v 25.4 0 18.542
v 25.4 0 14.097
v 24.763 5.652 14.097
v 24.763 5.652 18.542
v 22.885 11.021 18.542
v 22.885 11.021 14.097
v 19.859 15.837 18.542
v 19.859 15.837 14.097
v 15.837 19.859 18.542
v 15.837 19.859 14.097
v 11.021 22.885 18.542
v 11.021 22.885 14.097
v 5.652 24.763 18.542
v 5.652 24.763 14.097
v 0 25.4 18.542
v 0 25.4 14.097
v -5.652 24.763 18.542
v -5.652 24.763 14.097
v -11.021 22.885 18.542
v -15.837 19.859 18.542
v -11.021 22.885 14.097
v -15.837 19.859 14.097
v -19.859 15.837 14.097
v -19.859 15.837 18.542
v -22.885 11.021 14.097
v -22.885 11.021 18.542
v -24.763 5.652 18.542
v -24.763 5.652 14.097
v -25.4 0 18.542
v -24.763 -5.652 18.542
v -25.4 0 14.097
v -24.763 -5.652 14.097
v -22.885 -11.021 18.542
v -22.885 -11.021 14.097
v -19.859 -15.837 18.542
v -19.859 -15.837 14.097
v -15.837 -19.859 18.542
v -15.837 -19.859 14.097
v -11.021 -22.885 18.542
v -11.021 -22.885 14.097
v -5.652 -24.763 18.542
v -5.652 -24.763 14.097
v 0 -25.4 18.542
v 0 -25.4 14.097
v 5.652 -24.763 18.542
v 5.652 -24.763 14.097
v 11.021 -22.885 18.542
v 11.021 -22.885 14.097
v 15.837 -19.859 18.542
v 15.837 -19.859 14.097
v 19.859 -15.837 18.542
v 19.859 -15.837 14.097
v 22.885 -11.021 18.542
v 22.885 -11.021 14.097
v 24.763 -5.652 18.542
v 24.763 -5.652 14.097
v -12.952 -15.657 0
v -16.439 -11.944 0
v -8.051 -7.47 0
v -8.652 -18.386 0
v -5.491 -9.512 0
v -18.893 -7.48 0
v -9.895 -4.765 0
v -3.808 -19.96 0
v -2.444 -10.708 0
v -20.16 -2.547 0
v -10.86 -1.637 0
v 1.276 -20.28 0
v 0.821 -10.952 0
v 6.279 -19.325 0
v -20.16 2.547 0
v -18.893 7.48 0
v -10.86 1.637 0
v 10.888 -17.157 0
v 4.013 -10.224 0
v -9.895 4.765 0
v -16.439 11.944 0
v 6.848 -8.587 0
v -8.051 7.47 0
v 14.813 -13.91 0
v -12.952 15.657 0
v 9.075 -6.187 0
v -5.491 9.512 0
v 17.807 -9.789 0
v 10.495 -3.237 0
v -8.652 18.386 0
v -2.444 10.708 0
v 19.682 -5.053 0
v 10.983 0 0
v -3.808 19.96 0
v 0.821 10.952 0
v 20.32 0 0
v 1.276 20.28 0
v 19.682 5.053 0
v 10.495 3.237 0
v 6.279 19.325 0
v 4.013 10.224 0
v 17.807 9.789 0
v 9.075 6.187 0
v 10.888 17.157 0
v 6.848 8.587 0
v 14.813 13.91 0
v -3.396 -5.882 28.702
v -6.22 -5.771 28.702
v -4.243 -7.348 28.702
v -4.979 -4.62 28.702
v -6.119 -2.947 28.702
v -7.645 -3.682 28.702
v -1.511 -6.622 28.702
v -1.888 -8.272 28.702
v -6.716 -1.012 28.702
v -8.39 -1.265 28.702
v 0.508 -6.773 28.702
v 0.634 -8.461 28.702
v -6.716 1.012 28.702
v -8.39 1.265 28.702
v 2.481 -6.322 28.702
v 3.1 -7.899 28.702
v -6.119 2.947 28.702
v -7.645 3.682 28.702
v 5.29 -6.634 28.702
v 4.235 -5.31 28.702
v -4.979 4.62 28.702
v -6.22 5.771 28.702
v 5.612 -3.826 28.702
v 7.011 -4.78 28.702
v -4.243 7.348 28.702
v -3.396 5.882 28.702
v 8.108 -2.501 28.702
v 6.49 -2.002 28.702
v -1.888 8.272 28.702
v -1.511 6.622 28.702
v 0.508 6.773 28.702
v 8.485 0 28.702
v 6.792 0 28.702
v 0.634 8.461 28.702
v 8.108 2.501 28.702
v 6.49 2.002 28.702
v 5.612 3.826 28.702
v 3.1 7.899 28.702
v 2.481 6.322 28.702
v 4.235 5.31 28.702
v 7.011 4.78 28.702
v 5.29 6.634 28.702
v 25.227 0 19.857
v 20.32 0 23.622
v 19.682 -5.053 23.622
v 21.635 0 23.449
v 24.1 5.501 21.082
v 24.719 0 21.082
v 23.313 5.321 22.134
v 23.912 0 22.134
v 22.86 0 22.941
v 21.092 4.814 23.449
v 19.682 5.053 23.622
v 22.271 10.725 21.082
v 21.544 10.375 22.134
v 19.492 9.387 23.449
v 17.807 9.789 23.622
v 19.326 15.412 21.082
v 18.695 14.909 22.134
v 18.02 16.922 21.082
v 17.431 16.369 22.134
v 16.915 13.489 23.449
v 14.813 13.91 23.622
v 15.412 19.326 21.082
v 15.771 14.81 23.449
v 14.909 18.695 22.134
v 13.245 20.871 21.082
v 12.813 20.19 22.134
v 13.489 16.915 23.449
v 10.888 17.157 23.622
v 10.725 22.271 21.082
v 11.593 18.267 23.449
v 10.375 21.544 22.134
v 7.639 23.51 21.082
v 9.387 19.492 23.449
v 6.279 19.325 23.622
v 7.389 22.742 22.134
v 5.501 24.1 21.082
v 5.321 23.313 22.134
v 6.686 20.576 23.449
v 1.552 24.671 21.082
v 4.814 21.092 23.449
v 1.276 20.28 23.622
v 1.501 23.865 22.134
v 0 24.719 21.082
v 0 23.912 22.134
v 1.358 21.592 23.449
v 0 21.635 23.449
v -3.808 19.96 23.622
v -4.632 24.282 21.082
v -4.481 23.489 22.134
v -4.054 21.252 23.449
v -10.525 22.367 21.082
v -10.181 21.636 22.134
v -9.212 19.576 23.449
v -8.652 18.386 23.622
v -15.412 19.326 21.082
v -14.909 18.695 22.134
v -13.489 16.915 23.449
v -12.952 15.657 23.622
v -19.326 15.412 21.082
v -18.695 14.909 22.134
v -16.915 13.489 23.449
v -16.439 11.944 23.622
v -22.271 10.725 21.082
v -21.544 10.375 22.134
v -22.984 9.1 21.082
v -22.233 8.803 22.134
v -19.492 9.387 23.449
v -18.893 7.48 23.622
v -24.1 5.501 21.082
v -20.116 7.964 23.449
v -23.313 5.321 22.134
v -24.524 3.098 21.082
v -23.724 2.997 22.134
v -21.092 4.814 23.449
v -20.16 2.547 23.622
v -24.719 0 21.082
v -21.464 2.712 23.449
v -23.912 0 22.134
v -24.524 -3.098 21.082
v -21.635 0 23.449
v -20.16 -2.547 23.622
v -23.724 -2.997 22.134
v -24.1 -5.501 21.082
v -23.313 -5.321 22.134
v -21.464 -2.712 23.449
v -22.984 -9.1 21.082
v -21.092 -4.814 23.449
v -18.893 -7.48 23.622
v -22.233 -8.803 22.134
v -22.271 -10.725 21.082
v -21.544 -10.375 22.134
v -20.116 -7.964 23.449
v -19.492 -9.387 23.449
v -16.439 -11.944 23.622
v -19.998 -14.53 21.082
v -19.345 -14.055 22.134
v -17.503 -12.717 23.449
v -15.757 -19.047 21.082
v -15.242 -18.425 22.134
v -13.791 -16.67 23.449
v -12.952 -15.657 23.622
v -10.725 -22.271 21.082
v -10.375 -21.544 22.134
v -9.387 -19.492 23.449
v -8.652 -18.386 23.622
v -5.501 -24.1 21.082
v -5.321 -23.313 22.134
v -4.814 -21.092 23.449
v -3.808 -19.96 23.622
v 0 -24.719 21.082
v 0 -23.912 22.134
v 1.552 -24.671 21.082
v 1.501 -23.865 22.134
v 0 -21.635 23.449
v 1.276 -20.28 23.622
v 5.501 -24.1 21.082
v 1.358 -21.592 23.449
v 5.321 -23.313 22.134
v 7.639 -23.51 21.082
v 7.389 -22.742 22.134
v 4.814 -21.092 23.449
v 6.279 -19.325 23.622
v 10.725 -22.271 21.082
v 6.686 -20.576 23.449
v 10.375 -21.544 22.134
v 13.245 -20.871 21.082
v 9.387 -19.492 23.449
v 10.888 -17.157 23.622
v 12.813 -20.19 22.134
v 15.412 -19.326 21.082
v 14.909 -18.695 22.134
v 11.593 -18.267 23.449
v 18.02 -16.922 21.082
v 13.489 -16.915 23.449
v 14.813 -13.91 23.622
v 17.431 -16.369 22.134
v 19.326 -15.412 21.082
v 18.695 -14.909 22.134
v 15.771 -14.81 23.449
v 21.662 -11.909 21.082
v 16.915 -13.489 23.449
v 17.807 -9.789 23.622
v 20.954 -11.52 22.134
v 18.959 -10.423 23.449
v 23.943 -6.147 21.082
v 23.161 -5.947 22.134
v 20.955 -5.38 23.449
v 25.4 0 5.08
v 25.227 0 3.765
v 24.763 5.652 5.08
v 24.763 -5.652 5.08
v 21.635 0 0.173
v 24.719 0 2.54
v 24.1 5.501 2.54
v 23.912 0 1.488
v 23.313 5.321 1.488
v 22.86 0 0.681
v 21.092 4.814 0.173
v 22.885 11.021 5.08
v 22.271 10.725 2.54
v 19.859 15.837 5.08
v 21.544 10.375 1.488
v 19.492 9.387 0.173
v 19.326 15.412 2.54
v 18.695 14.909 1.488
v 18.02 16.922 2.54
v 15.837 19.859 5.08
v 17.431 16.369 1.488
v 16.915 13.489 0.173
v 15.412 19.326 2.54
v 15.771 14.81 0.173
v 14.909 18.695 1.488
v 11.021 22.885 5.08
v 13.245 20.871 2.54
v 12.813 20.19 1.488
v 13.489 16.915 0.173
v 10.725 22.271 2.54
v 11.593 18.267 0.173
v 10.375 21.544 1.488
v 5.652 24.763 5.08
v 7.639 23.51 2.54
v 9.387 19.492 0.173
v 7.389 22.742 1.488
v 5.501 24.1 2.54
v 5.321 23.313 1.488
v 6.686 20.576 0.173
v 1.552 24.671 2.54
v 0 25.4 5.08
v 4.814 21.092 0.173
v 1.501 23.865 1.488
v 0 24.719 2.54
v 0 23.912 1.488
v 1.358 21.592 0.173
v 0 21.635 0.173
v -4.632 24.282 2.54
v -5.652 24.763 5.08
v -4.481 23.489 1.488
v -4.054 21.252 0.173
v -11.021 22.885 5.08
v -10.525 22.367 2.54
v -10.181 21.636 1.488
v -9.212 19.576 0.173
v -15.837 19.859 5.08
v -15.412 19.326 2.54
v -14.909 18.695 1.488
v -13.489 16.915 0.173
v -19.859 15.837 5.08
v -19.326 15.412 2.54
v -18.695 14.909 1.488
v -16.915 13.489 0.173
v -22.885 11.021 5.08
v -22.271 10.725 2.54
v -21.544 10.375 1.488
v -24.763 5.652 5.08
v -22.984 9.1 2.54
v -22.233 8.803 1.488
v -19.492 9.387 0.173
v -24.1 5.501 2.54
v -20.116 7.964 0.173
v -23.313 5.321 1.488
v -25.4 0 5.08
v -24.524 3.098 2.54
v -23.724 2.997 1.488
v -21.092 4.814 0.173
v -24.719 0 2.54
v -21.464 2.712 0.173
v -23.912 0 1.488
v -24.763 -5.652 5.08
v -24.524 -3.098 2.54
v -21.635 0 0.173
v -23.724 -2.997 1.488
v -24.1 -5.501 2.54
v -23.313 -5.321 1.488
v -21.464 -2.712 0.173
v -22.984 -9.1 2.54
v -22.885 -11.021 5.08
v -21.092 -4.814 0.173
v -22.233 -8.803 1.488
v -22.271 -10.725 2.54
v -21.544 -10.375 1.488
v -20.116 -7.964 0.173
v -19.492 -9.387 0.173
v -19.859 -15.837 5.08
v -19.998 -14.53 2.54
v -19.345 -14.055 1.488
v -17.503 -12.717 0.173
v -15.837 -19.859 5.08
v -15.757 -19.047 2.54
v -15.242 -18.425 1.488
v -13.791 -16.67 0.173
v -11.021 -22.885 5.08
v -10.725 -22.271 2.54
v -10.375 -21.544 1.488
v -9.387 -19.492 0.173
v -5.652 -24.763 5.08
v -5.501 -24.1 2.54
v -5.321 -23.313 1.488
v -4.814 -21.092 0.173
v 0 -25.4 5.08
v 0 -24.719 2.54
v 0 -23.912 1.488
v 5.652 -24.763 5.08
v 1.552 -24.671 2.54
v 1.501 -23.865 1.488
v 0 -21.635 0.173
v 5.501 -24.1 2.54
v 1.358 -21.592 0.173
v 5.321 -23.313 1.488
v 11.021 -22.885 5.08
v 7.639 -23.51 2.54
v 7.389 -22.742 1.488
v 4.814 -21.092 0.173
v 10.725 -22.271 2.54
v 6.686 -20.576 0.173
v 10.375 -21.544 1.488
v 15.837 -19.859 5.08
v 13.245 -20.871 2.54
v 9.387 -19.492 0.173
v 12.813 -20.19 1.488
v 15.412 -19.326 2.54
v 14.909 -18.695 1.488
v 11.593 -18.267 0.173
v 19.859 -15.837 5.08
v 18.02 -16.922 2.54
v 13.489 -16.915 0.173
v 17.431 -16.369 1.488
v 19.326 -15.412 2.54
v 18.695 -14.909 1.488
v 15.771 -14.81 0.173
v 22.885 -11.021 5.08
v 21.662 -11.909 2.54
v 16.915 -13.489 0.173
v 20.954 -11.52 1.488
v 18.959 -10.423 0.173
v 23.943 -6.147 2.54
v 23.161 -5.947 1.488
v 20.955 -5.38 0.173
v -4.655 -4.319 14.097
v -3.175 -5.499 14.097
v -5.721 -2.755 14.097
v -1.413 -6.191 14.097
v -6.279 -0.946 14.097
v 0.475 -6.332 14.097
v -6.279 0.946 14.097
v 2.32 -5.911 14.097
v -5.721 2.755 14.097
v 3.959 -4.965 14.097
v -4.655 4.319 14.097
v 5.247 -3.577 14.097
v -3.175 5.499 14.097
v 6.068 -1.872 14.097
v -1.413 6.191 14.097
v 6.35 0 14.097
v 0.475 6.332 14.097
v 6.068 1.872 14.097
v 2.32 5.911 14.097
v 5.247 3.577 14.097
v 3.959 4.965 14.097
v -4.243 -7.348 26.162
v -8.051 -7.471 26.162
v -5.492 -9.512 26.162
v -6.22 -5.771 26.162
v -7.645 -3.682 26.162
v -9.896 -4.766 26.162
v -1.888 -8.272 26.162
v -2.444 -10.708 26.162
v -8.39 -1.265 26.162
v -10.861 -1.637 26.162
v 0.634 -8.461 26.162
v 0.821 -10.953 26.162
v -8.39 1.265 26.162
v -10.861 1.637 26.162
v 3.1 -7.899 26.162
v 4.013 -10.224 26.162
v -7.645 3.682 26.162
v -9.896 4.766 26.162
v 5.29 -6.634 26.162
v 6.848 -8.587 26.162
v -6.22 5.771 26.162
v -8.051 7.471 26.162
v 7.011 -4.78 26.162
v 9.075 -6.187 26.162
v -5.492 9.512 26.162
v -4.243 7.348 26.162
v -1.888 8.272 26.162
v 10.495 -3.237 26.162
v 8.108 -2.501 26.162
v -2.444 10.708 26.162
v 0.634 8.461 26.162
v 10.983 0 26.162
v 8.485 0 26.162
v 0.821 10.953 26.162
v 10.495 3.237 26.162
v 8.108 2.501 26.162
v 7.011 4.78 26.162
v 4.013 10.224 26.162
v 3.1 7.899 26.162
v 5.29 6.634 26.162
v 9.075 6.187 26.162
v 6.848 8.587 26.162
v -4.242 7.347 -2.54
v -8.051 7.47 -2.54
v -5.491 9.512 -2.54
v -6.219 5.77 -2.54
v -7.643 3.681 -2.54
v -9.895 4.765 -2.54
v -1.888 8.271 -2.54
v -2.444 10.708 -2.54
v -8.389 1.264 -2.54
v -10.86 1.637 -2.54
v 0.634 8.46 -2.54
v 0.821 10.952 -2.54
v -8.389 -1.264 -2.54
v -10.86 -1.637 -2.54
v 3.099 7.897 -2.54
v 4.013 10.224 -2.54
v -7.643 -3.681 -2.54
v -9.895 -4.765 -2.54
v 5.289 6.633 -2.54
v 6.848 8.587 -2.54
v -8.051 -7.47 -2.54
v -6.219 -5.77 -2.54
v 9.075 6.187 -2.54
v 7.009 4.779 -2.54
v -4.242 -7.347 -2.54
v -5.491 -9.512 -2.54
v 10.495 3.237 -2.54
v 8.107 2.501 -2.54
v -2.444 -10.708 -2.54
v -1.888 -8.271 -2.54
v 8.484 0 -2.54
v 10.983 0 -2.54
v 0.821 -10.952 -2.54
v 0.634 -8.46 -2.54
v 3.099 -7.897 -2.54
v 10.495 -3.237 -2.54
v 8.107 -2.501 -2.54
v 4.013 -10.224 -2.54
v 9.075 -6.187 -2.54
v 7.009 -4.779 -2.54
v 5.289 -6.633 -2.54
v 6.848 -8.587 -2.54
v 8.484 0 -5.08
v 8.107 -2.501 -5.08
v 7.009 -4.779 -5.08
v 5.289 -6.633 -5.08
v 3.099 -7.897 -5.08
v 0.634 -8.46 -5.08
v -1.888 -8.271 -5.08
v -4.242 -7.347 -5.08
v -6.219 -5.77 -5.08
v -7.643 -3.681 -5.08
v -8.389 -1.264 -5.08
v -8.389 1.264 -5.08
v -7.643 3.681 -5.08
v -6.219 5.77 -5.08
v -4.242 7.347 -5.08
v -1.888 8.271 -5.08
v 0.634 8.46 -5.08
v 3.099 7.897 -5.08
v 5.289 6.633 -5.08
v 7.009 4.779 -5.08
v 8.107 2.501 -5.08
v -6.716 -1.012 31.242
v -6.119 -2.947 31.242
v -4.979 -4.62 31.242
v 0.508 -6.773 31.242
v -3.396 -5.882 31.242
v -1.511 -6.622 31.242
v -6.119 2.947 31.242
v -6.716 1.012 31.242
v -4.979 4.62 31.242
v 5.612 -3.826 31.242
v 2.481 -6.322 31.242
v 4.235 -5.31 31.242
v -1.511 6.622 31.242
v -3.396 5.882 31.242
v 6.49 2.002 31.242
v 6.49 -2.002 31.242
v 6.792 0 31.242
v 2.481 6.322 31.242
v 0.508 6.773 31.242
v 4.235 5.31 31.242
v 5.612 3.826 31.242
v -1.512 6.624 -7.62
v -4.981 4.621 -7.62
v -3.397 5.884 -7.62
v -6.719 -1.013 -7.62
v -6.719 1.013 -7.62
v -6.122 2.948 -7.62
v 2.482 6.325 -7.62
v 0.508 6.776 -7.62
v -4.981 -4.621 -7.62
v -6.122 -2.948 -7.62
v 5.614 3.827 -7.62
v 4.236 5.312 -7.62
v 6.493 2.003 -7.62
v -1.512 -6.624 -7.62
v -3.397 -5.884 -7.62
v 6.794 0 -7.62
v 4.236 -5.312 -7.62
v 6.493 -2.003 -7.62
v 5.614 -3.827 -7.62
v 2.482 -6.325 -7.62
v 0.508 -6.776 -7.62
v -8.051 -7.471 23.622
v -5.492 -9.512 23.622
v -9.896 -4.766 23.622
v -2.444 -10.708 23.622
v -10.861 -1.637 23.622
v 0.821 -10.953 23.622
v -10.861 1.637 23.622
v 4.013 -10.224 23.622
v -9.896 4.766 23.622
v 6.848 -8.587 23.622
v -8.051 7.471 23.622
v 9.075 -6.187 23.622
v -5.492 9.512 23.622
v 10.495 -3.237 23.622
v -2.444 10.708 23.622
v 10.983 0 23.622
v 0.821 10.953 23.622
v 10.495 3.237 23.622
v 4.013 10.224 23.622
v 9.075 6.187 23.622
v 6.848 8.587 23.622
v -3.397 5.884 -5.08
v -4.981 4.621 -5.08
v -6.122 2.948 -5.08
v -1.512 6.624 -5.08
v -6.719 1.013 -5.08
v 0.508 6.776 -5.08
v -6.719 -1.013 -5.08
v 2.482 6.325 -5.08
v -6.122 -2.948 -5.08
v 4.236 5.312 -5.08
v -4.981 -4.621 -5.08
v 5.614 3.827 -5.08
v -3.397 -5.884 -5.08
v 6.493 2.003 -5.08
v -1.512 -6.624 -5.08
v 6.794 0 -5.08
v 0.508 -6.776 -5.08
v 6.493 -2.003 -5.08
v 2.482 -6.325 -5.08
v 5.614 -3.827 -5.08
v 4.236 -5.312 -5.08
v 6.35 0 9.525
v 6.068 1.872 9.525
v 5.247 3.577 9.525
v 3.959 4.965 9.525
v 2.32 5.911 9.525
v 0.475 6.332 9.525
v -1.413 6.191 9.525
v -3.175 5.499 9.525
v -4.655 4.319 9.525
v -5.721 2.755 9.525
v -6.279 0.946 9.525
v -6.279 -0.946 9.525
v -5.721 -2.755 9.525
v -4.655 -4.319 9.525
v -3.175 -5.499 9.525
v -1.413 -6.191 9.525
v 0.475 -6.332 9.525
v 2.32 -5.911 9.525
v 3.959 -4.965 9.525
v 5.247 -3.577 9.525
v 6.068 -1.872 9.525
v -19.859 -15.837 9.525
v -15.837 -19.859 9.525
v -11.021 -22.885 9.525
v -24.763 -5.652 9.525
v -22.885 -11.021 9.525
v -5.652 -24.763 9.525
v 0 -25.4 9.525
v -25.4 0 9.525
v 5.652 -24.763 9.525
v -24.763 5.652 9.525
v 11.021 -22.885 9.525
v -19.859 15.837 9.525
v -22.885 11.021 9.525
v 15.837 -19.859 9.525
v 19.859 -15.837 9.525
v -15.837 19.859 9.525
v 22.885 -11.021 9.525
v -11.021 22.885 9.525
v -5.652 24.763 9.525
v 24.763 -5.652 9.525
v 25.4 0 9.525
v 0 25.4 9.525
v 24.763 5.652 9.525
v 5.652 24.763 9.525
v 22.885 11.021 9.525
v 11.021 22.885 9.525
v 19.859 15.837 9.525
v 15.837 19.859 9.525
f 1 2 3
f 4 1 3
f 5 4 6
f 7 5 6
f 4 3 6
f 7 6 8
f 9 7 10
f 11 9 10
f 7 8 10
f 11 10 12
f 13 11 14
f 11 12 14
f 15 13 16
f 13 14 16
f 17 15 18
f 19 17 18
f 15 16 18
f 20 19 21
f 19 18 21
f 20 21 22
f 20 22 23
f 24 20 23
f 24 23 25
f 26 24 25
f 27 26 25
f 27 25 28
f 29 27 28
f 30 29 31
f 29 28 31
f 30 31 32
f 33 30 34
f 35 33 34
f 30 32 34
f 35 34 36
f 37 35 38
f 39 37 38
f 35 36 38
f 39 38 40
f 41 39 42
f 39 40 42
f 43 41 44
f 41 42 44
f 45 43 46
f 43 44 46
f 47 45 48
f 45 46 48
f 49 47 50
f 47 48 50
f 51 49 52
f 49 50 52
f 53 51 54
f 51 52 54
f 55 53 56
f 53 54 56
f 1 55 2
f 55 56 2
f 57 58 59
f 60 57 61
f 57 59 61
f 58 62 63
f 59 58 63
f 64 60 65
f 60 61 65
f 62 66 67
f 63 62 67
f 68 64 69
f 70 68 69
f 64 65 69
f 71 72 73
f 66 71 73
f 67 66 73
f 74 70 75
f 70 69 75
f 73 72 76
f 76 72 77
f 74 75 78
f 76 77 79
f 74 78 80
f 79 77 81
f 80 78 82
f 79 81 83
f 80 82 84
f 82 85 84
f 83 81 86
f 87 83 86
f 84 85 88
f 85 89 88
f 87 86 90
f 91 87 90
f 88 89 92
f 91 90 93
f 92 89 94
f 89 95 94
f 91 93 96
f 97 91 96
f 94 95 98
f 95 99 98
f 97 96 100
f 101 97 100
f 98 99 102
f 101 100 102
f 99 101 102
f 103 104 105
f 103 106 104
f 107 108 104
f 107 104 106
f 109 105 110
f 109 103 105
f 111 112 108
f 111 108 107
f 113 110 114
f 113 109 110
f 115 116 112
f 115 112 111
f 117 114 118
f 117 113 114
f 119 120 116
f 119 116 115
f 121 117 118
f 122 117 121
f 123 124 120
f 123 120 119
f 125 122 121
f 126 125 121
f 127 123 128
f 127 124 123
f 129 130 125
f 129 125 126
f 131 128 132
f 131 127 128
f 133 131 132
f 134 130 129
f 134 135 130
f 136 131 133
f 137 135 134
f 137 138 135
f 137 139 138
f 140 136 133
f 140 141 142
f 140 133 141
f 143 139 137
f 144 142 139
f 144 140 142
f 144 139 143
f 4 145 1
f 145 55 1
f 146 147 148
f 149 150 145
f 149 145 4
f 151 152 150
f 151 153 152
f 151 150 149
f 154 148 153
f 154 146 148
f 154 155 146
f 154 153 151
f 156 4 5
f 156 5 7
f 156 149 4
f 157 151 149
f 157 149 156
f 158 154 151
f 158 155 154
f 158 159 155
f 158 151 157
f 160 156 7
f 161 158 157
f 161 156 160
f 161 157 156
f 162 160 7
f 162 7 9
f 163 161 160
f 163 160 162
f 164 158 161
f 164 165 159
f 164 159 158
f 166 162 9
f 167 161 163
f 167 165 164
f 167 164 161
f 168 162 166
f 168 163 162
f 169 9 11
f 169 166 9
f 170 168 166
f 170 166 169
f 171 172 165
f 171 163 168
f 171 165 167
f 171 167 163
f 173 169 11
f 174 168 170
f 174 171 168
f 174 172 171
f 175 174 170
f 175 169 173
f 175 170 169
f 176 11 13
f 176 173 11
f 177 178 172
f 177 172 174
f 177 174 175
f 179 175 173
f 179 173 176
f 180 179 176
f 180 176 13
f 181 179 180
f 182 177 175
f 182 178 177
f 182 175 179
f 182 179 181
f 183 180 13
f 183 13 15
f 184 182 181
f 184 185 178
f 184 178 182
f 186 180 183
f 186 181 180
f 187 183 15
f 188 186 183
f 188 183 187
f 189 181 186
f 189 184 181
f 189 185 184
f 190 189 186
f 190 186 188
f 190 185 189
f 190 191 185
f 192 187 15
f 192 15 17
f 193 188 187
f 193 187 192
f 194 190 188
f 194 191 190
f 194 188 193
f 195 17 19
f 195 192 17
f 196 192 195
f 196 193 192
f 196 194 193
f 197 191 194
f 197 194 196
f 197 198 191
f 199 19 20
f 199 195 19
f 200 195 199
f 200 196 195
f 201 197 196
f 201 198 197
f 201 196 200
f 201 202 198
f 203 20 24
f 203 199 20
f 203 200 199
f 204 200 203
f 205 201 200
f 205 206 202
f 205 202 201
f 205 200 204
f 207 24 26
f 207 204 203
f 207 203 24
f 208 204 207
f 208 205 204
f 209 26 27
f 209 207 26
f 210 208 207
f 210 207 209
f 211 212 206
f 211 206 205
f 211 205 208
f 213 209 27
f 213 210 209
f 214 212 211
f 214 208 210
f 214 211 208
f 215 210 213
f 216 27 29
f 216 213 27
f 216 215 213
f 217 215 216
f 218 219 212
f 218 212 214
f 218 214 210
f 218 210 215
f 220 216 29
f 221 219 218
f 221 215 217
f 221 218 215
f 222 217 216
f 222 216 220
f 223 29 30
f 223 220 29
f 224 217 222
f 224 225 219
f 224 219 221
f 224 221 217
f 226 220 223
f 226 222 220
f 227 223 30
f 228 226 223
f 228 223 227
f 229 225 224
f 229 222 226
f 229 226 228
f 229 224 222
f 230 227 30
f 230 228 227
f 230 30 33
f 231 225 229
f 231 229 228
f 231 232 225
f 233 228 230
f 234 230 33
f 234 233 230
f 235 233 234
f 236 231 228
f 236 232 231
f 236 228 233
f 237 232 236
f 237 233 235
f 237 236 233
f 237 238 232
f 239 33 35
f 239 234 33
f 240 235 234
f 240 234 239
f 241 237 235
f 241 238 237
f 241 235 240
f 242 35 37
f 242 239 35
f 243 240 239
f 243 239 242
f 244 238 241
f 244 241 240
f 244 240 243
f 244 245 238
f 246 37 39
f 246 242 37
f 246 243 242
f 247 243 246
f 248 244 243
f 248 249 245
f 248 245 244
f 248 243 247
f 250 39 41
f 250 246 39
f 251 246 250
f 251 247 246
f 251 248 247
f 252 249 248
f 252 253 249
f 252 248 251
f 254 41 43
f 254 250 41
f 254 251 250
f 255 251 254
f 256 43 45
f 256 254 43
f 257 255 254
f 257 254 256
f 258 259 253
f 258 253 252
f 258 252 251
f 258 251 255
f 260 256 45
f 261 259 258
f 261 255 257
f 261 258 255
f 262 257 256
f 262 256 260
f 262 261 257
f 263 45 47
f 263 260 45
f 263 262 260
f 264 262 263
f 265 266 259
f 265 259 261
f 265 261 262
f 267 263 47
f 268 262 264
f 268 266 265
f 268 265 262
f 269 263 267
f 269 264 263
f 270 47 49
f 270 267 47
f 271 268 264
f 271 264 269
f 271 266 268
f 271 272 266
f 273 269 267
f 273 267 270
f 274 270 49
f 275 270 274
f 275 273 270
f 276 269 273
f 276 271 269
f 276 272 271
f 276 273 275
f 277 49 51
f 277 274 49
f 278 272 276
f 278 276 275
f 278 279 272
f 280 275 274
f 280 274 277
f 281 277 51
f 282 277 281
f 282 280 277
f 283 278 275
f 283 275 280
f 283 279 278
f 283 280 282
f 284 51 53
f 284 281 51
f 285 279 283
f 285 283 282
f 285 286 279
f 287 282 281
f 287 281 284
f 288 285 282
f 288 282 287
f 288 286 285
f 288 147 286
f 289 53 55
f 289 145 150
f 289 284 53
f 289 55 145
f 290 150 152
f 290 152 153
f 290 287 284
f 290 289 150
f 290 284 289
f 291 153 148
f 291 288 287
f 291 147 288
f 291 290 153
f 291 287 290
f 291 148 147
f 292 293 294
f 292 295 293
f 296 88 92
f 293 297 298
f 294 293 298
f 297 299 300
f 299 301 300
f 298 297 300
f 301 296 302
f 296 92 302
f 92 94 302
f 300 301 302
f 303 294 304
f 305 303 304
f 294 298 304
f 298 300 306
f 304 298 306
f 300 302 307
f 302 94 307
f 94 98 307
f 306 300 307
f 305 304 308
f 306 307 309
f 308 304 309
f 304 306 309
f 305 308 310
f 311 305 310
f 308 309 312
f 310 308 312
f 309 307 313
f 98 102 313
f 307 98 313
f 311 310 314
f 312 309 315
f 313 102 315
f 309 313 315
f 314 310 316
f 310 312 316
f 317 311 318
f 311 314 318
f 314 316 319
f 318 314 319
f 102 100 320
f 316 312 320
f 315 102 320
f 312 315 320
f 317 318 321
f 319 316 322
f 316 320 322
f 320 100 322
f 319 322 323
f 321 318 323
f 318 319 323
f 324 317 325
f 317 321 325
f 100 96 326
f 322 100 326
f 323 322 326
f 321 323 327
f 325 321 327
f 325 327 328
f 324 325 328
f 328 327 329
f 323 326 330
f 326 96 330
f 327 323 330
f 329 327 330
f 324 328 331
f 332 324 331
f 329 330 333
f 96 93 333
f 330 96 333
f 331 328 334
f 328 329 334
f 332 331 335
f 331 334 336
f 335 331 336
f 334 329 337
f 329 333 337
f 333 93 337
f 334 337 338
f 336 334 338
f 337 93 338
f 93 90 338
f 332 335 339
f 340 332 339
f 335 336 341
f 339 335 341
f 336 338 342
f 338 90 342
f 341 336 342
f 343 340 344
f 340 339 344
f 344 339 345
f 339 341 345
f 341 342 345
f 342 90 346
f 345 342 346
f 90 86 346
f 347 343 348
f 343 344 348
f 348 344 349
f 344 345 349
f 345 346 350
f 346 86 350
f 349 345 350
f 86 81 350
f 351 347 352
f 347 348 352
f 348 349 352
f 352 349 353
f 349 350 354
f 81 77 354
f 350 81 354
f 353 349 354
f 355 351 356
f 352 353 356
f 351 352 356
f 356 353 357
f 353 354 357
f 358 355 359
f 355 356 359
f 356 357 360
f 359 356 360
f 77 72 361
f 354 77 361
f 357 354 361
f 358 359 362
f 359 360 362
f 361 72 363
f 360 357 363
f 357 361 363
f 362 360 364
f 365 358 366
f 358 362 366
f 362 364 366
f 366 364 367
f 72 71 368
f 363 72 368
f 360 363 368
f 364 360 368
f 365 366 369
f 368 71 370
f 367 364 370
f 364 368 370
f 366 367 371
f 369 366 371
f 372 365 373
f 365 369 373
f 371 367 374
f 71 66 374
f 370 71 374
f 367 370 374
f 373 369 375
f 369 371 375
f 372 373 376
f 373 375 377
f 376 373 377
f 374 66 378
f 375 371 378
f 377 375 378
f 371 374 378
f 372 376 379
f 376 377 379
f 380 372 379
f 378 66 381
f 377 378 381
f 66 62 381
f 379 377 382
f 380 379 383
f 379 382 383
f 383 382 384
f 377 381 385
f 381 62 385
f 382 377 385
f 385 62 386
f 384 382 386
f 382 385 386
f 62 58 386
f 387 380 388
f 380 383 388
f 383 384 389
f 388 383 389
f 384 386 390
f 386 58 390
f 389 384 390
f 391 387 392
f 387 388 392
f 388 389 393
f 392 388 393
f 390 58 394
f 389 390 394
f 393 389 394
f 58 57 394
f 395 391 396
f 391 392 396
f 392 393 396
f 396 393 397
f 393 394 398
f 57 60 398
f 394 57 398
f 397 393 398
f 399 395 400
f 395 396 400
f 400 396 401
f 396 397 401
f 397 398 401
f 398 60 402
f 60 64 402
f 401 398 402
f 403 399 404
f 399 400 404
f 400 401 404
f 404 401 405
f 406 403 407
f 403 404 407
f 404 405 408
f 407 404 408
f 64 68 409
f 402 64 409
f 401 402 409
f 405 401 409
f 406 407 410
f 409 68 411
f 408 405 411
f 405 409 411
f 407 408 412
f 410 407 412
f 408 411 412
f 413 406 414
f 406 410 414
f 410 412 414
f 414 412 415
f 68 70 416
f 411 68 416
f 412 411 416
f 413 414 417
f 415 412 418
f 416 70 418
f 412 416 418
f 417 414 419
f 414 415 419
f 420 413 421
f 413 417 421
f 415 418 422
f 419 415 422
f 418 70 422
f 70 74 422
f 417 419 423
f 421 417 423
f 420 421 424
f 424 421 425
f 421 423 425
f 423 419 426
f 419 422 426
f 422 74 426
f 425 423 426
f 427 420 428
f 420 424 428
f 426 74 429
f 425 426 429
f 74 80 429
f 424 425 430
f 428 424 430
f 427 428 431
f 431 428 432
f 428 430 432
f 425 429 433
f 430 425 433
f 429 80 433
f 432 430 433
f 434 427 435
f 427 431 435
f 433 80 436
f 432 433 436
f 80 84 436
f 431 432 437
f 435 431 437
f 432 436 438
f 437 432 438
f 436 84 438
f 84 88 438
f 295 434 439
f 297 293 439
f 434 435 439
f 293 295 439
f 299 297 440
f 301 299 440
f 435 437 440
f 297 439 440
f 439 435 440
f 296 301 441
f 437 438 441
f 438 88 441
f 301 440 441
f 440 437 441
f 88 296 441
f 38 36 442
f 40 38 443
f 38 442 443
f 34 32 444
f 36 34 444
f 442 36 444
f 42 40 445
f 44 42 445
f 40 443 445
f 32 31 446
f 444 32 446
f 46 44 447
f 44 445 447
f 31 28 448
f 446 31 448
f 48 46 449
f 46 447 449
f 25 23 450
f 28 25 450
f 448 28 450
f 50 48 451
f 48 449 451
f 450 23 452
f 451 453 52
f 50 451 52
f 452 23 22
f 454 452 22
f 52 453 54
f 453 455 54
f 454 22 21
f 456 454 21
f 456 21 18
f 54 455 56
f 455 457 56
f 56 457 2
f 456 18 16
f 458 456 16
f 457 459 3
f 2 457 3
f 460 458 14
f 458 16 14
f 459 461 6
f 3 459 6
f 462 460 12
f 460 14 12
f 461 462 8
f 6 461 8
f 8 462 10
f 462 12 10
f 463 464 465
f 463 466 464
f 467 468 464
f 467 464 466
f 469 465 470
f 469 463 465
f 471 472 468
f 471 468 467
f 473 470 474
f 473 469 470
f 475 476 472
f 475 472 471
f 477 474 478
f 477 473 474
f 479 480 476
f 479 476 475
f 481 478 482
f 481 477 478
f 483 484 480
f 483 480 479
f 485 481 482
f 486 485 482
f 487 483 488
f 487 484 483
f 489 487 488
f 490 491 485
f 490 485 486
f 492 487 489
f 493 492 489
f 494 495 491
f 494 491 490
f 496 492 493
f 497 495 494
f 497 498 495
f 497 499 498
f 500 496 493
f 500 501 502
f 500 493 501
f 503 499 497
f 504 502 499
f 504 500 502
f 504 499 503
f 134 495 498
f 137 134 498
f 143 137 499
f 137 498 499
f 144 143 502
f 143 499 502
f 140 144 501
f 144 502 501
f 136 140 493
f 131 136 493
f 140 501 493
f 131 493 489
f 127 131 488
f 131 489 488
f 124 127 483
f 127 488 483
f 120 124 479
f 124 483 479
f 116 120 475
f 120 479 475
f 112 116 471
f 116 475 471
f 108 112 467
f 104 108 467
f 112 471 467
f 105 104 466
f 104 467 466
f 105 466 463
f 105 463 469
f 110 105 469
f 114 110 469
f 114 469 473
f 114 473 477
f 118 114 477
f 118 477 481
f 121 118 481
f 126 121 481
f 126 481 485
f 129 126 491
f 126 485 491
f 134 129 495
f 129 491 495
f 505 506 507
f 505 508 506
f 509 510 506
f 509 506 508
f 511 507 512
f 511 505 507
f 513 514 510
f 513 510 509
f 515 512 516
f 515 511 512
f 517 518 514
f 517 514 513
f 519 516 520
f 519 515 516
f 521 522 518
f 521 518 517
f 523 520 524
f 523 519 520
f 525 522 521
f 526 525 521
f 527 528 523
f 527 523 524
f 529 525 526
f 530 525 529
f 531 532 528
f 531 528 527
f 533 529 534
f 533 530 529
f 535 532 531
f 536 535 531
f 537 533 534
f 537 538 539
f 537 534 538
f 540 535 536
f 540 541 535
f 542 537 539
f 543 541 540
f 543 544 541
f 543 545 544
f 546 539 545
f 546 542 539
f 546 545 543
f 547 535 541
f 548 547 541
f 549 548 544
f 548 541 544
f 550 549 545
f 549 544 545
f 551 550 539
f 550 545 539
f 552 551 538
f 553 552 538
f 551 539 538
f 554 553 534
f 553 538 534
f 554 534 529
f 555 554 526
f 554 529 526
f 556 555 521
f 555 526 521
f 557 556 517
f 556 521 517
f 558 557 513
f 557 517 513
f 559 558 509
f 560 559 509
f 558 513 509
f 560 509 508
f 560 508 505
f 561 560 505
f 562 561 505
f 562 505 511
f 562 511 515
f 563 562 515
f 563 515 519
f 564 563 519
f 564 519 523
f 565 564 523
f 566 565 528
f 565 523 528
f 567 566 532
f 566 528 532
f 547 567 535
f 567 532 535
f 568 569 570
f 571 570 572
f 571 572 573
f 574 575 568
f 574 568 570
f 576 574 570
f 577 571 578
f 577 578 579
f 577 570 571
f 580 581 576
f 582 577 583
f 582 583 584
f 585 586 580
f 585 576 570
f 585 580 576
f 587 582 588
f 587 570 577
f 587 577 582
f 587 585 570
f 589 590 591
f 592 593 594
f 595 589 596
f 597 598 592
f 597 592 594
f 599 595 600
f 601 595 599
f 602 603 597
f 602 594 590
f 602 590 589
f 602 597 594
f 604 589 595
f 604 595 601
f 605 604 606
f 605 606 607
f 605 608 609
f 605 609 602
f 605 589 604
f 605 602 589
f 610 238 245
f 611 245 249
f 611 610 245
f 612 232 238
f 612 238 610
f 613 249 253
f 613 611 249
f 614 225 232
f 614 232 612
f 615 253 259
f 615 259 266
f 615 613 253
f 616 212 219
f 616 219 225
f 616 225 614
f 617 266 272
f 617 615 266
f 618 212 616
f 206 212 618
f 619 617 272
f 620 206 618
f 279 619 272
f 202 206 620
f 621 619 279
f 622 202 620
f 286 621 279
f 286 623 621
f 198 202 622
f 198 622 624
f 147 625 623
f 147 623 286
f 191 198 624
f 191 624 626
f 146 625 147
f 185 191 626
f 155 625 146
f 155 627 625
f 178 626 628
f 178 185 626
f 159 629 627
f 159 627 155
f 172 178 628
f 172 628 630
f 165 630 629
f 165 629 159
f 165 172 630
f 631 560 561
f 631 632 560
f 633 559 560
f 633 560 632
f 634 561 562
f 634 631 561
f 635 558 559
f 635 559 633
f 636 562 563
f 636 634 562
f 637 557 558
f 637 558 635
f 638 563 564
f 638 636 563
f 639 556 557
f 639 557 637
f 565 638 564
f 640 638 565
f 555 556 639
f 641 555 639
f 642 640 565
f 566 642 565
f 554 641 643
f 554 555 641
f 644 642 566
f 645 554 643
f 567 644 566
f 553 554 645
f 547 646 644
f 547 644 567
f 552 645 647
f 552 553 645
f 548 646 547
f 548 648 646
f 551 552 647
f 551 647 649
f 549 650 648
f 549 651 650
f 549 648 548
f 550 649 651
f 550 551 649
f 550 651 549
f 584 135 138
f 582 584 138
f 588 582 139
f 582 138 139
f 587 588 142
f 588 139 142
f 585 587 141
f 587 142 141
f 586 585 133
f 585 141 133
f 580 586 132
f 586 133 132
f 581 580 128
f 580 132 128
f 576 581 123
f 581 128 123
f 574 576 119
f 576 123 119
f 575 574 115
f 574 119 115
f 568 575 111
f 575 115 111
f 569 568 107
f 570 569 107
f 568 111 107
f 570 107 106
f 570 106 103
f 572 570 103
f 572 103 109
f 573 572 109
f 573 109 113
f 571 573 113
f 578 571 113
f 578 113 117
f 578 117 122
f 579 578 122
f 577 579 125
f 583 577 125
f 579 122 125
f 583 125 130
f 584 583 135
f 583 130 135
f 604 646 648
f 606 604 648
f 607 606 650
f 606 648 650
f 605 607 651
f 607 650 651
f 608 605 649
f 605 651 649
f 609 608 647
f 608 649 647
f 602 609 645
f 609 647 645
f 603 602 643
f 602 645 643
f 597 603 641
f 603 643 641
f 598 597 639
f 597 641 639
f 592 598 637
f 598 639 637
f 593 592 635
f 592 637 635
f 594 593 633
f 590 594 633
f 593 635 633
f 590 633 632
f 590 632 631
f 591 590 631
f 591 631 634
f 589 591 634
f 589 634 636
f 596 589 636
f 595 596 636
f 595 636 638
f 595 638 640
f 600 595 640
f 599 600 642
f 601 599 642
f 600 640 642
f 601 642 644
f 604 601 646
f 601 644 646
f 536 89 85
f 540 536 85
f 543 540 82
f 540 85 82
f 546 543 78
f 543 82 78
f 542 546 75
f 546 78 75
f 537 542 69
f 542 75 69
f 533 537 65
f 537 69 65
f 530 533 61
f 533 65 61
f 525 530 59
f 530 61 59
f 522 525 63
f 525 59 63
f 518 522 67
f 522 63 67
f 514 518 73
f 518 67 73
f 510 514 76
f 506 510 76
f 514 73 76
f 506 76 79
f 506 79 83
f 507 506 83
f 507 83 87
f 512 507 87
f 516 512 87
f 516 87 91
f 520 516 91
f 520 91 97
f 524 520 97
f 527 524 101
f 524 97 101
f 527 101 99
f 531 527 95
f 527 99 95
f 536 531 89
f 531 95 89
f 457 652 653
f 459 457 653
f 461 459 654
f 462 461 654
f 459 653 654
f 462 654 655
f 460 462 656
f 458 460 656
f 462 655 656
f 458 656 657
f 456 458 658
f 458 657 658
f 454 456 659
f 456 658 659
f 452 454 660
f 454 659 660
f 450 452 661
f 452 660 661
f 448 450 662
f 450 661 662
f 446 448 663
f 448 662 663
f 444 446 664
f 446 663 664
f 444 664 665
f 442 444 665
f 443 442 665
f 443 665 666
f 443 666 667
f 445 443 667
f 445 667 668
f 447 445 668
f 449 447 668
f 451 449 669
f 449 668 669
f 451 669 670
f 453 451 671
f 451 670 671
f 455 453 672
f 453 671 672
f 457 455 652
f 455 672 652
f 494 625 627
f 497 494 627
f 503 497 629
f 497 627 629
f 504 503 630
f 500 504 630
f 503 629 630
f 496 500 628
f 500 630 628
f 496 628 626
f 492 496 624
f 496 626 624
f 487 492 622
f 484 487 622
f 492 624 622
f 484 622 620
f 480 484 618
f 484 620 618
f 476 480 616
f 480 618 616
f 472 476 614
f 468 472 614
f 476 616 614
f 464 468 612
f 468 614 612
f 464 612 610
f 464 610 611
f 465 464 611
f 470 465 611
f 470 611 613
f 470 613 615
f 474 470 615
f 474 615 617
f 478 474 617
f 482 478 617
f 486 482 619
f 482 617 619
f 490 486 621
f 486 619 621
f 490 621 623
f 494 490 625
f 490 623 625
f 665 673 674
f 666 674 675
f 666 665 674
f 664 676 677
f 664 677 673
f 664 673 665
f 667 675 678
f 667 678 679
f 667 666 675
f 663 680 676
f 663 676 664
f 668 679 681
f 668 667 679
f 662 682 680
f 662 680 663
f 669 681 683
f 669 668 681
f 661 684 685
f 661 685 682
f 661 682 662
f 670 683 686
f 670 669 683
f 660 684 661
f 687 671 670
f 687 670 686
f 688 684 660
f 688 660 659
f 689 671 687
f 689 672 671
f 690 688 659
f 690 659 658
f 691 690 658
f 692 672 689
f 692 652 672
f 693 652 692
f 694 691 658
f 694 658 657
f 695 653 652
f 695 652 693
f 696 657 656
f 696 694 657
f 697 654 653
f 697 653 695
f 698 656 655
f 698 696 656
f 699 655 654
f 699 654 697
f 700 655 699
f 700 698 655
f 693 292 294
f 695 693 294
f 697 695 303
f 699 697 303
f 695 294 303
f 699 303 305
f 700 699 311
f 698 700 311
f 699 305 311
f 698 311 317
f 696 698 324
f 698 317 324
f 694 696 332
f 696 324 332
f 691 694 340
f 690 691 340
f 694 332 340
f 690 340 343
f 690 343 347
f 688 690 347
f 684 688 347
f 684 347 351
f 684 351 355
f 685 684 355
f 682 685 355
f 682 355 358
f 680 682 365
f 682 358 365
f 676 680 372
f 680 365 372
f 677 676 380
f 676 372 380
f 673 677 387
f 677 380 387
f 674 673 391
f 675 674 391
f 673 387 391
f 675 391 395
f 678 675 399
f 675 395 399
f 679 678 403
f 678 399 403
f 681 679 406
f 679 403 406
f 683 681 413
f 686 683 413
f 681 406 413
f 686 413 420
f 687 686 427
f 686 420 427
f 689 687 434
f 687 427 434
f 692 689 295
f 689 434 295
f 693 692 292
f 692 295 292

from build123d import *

# Parameters (mm, degrees)
F0_R         = 25.4
F1_DEPTH     = 9.525
F2_R         = 6.35
F3_DEPTH     = 4.572
F4_R         = 25.4
F4_R_2       = 6.35
F5_DEPTH     = 9.525
F6_R         = 5.08
F7_R         = 10.9834381756
F8_DEPTH     = 2.54
F9_R         = 8.4850918215
F10_DEPTH    = 2.54
F11_R        = 6.7919077929
F12_DEPTH    = 2.54
F13_R        = 10.98296
F10_FACE_R   = 8.4850918215
F10_FACE_R_2 = 6.7919077929
F14_DEPTH    = 2.54
F15_R        = 8.4836
F16_DEPTH    = 2.54
F17_R        = 6.7945
F18_DEPTH    = 2.54


with BuildPart() as f1:
    # F0 (on Top) → F1 (new body)
    with BuildSketch(Plane.XY):
        Circle(F0_R)
    extrude(amount=F1_DEPTH)

    # F2 (on face) → F3 (join)
    with BuildSketch(Plane.XY.offset(9.525)):
        Circle(F2_R)
    extrude(amount=F3_DEPTH)

    # F0 (on Top) + F4 (on face) → F5 (join)
    with BuildSketch(Plane.XY):
        Circle(F0_R)
    with BuildSketch(Plane.XY.offset(14.097)):
        Circle(F4_R)
        Circle(F4_R_2, mode=Mode.SUBTRACT)
        Circle(F4_R_2)
    extrude(amount=F5_DEPTH)

    # F6
    f6_edges = [f1.edges().sort_by_distance(p)[0] for p in [
        (-25.4, 0, 23.622),
        (-25.4, 0, 0),
    ]]
    fillet(f6_edges, radius=F6_R)

    # F7 (on face) → F8 (join)
    with BuildSketch(Plane.XY.offset(23.622)):
        Circle(F7_R)
    extrude(amount=F8_DEPTH)

    # F9 (on face) → F10 (join)
    with BuildSketch(Plane.XY.offset(26.162)):
        Circle(F9_R)
    extrude(amount=F10_DEPTH)

    # F11 (on face) → F12 (join)
    with BuildSketch(Plane.XY.offset(28.702)):
        Circle(F11_R)
    extrude(amount=F12_DEPTH)

    # F13 (on face) + F10_face (on face) → F14 (join)
    with BuildSketch(Plane(origin=(0, 0, 0), x_dir=(1, 0, 0), z_dir=(0, 0, -1))):
        Circle(F13_R)
    with BuildSketch(Plane.XY.offset(28.702)):
        Circle(F10_FACE_R)
        Circle(F10_FACE_R_2, mode=Mode.SUBTRACT)
    extrude(amount=F14_DEPTH, dir=(0, 0, -1))

    # F15 (on face) → F16 (join)
    with BuildSketch(Plane(origin=(0, 0, -2.54), x_dir=(1, 0, 0), z_dir=(0, 0, -1))):
        Circle(F15_R)
    extrude(amount=F16_DEPTH)

    # F17 (on face) → F18 (join)
    with BuildSketch(Plane(origin=(0, 0, -5.08), x_dir=(1, 0, 0), z_dir=(0, 0, -1))):
        Circle(F17_R)
    extrude(amount=F18_DEPTH)


solid = f1.part
